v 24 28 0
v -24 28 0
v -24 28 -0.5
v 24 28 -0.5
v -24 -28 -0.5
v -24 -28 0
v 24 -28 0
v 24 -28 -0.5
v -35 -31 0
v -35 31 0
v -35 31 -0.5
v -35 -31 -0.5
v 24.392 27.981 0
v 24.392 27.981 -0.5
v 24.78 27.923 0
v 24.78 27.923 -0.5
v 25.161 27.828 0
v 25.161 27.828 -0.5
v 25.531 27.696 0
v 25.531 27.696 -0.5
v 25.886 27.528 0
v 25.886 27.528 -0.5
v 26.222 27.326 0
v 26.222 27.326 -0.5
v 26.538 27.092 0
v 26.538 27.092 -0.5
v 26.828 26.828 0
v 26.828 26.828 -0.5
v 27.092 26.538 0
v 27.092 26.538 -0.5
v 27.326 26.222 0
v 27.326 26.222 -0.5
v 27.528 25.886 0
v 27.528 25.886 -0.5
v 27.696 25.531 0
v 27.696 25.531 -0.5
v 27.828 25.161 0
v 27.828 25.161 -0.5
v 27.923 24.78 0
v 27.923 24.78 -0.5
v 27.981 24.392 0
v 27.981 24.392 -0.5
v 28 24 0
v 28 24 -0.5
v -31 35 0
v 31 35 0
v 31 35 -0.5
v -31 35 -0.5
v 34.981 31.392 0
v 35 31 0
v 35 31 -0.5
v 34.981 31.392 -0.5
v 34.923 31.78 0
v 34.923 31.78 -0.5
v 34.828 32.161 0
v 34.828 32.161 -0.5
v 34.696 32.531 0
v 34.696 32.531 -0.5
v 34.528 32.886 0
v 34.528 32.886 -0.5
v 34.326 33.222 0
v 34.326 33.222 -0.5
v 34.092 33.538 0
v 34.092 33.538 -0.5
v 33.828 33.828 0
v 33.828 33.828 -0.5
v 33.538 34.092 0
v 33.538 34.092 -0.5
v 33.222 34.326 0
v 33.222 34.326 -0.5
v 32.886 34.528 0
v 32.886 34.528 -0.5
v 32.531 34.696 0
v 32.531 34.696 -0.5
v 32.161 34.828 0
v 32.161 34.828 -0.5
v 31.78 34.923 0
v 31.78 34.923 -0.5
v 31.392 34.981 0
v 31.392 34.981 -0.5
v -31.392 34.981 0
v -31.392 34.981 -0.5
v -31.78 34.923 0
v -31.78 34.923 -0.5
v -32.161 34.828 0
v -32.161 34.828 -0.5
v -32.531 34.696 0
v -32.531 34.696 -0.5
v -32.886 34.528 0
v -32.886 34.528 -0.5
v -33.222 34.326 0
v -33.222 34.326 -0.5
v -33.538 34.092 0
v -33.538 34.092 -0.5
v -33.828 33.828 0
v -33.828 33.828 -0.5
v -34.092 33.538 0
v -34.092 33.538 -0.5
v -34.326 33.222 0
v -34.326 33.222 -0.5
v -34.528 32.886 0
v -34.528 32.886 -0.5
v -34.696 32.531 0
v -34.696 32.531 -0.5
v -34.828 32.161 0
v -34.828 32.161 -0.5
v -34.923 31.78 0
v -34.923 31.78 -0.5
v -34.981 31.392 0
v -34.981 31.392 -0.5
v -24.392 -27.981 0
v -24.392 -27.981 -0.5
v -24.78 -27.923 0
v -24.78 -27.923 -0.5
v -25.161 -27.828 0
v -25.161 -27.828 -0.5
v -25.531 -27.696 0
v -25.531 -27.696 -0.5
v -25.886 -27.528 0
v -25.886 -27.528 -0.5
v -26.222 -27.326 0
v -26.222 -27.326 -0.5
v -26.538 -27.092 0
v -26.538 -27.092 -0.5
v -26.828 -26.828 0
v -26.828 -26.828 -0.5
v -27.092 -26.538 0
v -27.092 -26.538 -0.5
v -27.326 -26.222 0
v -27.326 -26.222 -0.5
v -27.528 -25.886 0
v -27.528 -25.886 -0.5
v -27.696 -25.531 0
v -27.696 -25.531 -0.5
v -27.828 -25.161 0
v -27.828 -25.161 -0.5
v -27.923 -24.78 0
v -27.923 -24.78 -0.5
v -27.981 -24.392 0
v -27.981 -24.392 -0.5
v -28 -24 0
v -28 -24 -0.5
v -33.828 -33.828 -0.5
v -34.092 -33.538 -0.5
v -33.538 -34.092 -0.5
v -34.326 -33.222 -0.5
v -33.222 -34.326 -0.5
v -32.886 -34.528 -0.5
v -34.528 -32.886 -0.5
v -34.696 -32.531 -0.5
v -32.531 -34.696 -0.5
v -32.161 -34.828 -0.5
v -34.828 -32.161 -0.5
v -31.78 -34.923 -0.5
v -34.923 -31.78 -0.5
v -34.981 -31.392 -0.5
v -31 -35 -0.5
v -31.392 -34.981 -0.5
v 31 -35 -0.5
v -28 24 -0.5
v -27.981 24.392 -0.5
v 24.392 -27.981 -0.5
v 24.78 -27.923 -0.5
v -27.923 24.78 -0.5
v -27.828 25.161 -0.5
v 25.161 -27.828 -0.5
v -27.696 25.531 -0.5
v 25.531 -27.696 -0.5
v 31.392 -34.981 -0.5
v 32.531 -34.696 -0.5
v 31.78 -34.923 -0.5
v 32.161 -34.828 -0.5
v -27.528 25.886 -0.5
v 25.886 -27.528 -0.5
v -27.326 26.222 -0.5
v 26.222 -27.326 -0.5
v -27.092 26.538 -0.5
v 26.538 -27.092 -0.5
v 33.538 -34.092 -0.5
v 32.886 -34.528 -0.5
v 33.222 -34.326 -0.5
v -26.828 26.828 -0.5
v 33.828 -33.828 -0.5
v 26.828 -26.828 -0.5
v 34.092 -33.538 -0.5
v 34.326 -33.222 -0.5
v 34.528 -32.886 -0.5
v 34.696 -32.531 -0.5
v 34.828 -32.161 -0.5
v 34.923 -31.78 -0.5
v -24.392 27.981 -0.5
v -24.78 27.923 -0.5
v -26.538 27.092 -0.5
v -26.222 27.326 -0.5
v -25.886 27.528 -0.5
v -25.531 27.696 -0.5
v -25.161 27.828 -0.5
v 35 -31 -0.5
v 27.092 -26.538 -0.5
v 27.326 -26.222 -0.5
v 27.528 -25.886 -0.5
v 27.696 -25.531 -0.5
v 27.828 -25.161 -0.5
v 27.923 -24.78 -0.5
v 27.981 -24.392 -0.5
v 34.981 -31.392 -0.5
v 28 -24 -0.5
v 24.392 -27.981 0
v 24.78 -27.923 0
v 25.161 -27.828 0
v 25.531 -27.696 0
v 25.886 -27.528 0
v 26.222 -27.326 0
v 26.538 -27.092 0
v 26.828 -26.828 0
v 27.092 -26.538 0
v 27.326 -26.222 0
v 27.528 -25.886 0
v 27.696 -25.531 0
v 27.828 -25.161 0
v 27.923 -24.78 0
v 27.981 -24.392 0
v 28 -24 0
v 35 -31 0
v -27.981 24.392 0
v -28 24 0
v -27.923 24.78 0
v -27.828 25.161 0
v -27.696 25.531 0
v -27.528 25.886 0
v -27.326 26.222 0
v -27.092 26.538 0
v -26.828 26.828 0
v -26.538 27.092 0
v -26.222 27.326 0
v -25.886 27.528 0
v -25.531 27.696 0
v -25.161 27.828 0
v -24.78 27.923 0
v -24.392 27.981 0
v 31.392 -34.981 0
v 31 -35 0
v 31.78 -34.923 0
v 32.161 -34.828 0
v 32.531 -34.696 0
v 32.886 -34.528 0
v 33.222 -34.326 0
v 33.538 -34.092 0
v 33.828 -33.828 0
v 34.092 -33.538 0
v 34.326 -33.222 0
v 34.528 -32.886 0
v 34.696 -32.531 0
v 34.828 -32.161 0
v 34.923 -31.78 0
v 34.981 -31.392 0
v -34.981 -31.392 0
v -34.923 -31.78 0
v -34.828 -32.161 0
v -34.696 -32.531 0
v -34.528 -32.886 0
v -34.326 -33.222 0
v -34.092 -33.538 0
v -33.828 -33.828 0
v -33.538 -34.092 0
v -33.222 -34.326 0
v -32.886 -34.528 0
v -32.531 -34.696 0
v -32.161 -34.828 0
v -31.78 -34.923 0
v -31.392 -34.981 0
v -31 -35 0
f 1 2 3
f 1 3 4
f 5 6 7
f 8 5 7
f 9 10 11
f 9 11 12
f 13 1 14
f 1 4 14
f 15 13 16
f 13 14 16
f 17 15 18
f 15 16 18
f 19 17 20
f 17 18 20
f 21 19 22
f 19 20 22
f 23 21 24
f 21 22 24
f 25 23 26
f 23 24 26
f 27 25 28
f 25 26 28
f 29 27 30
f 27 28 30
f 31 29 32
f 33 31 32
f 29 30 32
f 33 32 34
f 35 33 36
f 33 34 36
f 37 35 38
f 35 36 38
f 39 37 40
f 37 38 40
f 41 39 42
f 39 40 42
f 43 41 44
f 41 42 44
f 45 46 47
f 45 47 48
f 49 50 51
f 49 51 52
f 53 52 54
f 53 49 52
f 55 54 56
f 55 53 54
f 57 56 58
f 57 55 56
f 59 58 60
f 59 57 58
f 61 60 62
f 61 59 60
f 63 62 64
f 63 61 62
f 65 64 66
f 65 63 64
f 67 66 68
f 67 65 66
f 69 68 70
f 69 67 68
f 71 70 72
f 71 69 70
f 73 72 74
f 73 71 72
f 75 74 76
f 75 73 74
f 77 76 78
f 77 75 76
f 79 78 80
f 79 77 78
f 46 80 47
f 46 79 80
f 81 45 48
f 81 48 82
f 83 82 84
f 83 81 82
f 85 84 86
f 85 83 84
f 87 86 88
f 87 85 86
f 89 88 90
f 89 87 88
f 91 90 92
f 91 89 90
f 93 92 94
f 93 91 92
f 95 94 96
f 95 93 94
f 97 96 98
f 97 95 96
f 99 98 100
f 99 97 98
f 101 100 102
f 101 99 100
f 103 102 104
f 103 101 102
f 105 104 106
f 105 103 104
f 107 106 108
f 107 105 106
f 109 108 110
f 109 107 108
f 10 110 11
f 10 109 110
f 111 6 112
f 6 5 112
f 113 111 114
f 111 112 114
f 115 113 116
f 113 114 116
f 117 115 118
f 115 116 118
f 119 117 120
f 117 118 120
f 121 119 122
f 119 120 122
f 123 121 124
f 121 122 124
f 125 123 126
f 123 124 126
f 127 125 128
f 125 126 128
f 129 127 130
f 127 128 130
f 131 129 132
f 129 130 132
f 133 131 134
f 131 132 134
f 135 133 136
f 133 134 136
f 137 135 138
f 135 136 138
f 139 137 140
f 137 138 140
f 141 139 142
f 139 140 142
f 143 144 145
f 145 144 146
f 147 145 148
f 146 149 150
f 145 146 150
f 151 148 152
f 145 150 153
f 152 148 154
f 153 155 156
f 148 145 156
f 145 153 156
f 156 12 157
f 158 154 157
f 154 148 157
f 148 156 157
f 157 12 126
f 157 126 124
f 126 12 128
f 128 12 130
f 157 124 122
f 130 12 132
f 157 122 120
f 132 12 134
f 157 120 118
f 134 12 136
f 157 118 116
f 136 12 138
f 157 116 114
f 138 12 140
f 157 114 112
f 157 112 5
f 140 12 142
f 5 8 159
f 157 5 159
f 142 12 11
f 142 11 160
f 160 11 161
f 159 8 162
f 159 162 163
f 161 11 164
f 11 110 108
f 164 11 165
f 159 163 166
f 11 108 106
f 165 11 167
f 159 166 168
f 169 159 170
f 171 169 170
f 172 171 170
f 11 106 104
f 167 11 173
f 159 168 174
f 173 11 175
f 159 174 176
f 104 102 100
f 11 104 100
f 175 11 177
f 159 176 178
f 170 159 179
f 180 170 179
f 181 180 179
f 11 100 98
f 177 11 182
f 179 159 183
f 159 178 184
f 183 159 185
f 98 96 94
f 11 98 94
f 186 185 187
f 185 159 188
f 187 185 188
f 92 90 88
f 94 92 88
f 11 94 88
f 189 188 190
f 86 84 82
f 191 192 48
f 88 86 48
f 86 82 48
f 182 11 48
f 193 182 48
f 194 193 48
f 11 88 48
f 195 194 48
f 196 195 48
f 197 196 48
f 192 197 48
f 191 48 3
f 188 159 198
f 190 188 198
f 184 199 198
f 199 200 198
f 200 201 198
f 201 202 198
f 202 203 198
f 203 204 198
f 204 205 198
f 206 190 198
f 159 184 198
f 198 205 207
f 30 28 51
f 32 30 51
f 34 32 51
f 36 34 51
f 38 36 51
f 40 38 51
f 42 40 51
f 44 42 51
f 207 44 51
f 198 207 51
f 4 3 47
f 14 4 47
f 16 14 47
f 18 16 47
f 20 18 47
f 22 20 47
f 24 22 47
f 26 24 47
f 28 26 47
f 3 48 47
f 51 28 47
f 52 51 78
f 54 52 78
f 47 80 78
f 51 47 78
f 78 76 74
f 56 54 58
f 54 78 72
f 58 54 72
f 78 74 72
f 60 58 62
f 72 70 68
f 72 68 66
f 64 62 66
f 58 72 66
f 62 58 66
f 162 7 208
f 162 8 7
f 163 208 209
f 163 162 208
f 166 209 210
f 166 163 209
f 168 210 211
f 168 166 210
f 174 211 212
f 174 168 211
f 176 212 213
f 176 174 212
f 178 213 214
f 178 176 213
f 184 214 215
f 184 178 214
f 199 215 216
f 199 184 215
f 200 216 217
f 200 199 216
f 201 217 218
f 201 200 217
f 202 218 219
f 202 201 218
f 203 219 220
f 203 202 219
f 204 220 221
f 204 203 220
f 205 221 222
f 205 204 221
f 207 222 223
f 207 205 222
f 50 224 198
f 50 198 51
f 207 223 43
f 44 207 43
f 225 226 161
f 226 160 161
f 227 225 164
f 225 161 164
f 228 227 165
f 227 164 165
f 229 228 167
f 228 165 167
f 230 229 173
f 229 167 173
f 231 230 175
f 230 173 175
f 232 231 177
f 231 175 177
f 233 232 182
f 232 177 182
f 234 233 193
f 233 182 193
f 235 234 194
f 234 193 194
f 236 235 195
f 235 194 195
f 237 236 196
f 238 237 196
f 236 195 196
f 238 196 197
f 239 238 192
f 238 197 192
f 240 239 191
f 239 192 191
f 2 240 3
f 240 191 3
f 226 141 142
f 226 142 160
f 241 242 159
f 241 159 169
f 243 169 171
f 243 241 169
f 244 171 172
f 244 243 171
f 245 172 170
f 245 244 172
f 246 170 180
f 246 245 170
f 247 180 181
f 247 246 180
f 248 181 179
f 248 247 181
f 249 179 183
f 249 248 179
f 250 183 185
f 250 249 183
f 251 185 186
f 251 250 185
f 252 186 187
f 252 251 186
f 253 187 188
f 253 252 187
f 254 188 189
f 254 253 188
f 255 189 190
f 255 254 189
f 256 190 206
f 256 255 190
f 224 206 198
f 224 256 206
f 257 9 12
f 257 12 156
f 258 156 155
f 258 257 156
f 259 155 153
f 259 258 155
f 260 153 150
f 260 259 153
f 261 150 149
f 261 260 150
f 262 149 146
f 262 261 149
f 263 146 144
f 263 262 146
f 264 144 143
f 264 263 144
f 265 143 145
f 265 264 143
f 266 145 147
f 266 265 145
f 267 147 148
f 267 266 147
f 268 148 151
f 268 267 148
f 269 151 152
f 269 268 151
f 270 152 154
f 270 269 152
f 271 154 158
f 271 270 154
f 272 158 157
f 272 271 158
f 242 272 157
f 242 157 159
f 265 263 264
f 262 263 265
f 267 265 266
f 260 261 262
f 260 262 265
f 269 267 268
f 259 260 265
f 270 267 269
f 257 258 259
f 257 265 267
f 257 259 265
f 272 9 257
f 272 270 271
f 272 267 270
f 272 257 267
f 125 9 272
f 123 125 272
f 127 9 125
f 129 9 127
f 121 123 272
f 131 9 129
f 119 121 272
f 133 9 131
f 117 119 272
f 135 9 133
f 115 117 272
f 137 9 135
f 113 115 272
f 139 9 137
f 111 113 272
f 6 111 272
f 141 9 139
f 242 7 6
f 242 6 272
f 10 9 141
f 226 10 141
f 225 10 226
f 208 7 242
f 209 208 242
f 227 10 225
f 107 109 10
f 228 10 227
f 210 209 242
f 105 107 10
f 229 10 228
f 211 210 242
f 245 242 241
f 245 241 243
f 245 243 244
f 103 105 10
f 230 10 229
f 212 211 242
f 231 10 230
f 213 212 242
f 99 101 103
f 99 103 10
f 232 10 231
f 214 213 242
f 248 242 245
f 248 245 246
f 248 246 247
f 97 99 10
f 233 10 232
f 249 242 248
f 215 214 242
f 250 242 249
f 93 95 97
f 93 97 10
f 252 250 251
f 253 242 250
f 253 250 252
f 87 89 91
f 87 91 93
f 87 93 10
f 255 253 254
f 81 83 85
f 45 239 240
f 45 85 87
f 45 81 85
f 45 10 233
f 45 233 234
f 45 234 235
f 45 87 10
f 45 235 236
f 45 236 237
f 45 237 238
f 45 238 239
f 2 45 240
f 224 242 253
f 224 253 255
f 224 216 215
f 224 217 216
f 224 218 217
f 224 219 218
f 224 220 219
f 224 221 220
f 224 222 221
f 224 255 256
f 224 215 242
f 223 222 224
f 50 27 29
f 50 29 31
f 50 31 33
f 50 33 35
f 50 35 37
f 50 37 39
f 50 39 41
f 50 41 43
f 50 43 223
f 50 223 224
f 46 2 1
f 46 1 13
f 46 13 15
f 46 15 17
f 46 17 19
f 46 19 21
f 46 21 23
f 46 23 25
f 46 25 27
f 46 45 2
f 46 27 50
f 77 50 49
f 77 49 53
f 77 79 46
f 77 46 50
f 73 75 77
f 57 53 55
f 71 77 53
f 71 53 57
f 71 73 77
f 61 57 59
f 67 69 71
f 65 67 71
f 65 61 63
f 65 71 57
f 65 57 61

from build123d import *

# Parameters (mm, degrees)
F0_W     = 56
F0_H     = 56
F1_DEPTH = 0.5
F2_R     = 4


with BuildPart() as f1:
    # F0 (on Top) → F1 (new body)
    with BuildSketch(Plane.XY):
        with BuildLine():
            Line((27.535898, 33), (-27.535898, 33))
            ThreePointArc((-27.535898, 33), (-27.136297, 32.035276), (-27, 31))
            ThreePointArc((-27, 31), (-29, 27.535898), (-33, 27.535898))
            Line((-33, 27.535898), (-33, -27.535898))
            ThreePointArc((-33, -27.535898), (-29, -27.535898), (-27, -31))
            ThreePointArc((-27, -31), (-27.136297, -32.035276), (-27.535898, -33))
            Line((-27.535898, -33), (27.535898, -33))
            ThreePointArc((27.535898, -33), (28.171573, -28.171573), (33, -27.535898))
            Line((33, -27.535898), (33, 27.535898))
            ThreePointArc((33, 27.535898), (28.171573, 28.171573), (27.535898, 33))
        make_face()
        Rectangle(F0_W, F0_H, mode=Mode.SUBTRACT)
        with BuildLine():
            Line((31, 35), (-31, 35))
            ThreePointArc((-31, 35), (-29, 34.464102), (-27.535898, 33))
            Line((-27.535898, 33), (27.535898, 33))
            ThreePointArc((27.535898, 33), (29, 34.464102), (31, 35))
        make_face()
        with BuildLine():
            ThreePointArc((35, 31), (33.828427, 33.828427), (31, 35))
            ThreePointArc((31, 35), (29, 34.464102), (27.535898, 33))
            ThreePointArc((27.535898, 33), (28.171573, 28.171573), (33, 27.535898))
            ThreePointArc((33, 27.535898), (34.464102, 29), (35, 31))
        make_face()
        with BuildLine():
            Line((35, -31), (35, 31))
            ThreePointArc((35, 31), (34.464102, 29), (33, 27.535898))
            Line((33, 27.535898), (33, -27.535898))
            ThreePointArc((33, -27.535898), (34.464102, -29), (35, -31))
        make_face()
        with BuildLine():
            ThreePointArc((31, -35), (33.828427, -33.828427), (35, -31))
            ThreePointArc((35, -31), (34.464102, -29), (33, -27.535898))
            ThreePointArc((33, -27.535898), (28.171573, -28.171573), (27.535898, -33))
            ThreePointArc((27.535898, -33), (29, -34.464102), (31, -35))
        make_face()
        with BuildLine():
            ThreePointArc((-27.535898, -33), (-29, -34.464102), (-31, -35))
            Line((-31, -35), (31, -35))
            ThreePointArc((31, -35), (29, -34.464102), (27.535898, -33))
            Line((27.535898, -33), (-27.535898, -33))
        make_face()
        with BuildLine():
            ThreePointArc((-33, 27.535898), (-34.464102, 29), (-35, 31))
            Line((-35, 31), (-35, -31))
            ThreePointArc((-35, -31), (-34.464102, -29), (-33, -27.535898))
            Line((-33, -27.535898), (-33, 27.535898))
        make_face()
        with BuildLine():
            ThreePointArc((-33, -27.535898), (-34.464102, -29), (-35, -31))
            ThreePointArc((-35, -31), (-33.828427, -33.828427), (-31, -35))
            ThreePointArc((-31, -35), (-29, -34.464102), (-27.535898, -33))
            ThreePointArc((-27.535898, -33), (-27.136297, -32.035276), (-27, -31))
            ThreePointArc((-27, -31), (-29, -27.535898), (-33, -27.535898))
        make_face()
        with BuildLine():
            ThreePointArc((-27.535898, 33), (-29, 34.464102), (-31, 35))
            ThreePointArc((-31, 35), (-33.828427, 33.828427), (-35, 31))
            ThreePointArc((-35, 31), (-34.464102, 29), (-33, 27.535898))
            ThreePointArc((-33, 27.535898), (-29, 27.535898), (-27, 31))
            ThreePointArc((-27, 31), (-27.136297, 32.035276), (-27.535898, 33))
        make_face()
    extrude(amount=-F1_DEPTH)

    # F2
    f2_edges = [f1.edges().sort_by_distance(p)[0] for p in [
        (-28, -28, -0.25),
        (-28, 28, -0.25),
        (28, 28, -0.25),
        (28, -28, -0.25),
    ]]
    fillet(f2_edges, radius=F2_R)


solid = f1.part
